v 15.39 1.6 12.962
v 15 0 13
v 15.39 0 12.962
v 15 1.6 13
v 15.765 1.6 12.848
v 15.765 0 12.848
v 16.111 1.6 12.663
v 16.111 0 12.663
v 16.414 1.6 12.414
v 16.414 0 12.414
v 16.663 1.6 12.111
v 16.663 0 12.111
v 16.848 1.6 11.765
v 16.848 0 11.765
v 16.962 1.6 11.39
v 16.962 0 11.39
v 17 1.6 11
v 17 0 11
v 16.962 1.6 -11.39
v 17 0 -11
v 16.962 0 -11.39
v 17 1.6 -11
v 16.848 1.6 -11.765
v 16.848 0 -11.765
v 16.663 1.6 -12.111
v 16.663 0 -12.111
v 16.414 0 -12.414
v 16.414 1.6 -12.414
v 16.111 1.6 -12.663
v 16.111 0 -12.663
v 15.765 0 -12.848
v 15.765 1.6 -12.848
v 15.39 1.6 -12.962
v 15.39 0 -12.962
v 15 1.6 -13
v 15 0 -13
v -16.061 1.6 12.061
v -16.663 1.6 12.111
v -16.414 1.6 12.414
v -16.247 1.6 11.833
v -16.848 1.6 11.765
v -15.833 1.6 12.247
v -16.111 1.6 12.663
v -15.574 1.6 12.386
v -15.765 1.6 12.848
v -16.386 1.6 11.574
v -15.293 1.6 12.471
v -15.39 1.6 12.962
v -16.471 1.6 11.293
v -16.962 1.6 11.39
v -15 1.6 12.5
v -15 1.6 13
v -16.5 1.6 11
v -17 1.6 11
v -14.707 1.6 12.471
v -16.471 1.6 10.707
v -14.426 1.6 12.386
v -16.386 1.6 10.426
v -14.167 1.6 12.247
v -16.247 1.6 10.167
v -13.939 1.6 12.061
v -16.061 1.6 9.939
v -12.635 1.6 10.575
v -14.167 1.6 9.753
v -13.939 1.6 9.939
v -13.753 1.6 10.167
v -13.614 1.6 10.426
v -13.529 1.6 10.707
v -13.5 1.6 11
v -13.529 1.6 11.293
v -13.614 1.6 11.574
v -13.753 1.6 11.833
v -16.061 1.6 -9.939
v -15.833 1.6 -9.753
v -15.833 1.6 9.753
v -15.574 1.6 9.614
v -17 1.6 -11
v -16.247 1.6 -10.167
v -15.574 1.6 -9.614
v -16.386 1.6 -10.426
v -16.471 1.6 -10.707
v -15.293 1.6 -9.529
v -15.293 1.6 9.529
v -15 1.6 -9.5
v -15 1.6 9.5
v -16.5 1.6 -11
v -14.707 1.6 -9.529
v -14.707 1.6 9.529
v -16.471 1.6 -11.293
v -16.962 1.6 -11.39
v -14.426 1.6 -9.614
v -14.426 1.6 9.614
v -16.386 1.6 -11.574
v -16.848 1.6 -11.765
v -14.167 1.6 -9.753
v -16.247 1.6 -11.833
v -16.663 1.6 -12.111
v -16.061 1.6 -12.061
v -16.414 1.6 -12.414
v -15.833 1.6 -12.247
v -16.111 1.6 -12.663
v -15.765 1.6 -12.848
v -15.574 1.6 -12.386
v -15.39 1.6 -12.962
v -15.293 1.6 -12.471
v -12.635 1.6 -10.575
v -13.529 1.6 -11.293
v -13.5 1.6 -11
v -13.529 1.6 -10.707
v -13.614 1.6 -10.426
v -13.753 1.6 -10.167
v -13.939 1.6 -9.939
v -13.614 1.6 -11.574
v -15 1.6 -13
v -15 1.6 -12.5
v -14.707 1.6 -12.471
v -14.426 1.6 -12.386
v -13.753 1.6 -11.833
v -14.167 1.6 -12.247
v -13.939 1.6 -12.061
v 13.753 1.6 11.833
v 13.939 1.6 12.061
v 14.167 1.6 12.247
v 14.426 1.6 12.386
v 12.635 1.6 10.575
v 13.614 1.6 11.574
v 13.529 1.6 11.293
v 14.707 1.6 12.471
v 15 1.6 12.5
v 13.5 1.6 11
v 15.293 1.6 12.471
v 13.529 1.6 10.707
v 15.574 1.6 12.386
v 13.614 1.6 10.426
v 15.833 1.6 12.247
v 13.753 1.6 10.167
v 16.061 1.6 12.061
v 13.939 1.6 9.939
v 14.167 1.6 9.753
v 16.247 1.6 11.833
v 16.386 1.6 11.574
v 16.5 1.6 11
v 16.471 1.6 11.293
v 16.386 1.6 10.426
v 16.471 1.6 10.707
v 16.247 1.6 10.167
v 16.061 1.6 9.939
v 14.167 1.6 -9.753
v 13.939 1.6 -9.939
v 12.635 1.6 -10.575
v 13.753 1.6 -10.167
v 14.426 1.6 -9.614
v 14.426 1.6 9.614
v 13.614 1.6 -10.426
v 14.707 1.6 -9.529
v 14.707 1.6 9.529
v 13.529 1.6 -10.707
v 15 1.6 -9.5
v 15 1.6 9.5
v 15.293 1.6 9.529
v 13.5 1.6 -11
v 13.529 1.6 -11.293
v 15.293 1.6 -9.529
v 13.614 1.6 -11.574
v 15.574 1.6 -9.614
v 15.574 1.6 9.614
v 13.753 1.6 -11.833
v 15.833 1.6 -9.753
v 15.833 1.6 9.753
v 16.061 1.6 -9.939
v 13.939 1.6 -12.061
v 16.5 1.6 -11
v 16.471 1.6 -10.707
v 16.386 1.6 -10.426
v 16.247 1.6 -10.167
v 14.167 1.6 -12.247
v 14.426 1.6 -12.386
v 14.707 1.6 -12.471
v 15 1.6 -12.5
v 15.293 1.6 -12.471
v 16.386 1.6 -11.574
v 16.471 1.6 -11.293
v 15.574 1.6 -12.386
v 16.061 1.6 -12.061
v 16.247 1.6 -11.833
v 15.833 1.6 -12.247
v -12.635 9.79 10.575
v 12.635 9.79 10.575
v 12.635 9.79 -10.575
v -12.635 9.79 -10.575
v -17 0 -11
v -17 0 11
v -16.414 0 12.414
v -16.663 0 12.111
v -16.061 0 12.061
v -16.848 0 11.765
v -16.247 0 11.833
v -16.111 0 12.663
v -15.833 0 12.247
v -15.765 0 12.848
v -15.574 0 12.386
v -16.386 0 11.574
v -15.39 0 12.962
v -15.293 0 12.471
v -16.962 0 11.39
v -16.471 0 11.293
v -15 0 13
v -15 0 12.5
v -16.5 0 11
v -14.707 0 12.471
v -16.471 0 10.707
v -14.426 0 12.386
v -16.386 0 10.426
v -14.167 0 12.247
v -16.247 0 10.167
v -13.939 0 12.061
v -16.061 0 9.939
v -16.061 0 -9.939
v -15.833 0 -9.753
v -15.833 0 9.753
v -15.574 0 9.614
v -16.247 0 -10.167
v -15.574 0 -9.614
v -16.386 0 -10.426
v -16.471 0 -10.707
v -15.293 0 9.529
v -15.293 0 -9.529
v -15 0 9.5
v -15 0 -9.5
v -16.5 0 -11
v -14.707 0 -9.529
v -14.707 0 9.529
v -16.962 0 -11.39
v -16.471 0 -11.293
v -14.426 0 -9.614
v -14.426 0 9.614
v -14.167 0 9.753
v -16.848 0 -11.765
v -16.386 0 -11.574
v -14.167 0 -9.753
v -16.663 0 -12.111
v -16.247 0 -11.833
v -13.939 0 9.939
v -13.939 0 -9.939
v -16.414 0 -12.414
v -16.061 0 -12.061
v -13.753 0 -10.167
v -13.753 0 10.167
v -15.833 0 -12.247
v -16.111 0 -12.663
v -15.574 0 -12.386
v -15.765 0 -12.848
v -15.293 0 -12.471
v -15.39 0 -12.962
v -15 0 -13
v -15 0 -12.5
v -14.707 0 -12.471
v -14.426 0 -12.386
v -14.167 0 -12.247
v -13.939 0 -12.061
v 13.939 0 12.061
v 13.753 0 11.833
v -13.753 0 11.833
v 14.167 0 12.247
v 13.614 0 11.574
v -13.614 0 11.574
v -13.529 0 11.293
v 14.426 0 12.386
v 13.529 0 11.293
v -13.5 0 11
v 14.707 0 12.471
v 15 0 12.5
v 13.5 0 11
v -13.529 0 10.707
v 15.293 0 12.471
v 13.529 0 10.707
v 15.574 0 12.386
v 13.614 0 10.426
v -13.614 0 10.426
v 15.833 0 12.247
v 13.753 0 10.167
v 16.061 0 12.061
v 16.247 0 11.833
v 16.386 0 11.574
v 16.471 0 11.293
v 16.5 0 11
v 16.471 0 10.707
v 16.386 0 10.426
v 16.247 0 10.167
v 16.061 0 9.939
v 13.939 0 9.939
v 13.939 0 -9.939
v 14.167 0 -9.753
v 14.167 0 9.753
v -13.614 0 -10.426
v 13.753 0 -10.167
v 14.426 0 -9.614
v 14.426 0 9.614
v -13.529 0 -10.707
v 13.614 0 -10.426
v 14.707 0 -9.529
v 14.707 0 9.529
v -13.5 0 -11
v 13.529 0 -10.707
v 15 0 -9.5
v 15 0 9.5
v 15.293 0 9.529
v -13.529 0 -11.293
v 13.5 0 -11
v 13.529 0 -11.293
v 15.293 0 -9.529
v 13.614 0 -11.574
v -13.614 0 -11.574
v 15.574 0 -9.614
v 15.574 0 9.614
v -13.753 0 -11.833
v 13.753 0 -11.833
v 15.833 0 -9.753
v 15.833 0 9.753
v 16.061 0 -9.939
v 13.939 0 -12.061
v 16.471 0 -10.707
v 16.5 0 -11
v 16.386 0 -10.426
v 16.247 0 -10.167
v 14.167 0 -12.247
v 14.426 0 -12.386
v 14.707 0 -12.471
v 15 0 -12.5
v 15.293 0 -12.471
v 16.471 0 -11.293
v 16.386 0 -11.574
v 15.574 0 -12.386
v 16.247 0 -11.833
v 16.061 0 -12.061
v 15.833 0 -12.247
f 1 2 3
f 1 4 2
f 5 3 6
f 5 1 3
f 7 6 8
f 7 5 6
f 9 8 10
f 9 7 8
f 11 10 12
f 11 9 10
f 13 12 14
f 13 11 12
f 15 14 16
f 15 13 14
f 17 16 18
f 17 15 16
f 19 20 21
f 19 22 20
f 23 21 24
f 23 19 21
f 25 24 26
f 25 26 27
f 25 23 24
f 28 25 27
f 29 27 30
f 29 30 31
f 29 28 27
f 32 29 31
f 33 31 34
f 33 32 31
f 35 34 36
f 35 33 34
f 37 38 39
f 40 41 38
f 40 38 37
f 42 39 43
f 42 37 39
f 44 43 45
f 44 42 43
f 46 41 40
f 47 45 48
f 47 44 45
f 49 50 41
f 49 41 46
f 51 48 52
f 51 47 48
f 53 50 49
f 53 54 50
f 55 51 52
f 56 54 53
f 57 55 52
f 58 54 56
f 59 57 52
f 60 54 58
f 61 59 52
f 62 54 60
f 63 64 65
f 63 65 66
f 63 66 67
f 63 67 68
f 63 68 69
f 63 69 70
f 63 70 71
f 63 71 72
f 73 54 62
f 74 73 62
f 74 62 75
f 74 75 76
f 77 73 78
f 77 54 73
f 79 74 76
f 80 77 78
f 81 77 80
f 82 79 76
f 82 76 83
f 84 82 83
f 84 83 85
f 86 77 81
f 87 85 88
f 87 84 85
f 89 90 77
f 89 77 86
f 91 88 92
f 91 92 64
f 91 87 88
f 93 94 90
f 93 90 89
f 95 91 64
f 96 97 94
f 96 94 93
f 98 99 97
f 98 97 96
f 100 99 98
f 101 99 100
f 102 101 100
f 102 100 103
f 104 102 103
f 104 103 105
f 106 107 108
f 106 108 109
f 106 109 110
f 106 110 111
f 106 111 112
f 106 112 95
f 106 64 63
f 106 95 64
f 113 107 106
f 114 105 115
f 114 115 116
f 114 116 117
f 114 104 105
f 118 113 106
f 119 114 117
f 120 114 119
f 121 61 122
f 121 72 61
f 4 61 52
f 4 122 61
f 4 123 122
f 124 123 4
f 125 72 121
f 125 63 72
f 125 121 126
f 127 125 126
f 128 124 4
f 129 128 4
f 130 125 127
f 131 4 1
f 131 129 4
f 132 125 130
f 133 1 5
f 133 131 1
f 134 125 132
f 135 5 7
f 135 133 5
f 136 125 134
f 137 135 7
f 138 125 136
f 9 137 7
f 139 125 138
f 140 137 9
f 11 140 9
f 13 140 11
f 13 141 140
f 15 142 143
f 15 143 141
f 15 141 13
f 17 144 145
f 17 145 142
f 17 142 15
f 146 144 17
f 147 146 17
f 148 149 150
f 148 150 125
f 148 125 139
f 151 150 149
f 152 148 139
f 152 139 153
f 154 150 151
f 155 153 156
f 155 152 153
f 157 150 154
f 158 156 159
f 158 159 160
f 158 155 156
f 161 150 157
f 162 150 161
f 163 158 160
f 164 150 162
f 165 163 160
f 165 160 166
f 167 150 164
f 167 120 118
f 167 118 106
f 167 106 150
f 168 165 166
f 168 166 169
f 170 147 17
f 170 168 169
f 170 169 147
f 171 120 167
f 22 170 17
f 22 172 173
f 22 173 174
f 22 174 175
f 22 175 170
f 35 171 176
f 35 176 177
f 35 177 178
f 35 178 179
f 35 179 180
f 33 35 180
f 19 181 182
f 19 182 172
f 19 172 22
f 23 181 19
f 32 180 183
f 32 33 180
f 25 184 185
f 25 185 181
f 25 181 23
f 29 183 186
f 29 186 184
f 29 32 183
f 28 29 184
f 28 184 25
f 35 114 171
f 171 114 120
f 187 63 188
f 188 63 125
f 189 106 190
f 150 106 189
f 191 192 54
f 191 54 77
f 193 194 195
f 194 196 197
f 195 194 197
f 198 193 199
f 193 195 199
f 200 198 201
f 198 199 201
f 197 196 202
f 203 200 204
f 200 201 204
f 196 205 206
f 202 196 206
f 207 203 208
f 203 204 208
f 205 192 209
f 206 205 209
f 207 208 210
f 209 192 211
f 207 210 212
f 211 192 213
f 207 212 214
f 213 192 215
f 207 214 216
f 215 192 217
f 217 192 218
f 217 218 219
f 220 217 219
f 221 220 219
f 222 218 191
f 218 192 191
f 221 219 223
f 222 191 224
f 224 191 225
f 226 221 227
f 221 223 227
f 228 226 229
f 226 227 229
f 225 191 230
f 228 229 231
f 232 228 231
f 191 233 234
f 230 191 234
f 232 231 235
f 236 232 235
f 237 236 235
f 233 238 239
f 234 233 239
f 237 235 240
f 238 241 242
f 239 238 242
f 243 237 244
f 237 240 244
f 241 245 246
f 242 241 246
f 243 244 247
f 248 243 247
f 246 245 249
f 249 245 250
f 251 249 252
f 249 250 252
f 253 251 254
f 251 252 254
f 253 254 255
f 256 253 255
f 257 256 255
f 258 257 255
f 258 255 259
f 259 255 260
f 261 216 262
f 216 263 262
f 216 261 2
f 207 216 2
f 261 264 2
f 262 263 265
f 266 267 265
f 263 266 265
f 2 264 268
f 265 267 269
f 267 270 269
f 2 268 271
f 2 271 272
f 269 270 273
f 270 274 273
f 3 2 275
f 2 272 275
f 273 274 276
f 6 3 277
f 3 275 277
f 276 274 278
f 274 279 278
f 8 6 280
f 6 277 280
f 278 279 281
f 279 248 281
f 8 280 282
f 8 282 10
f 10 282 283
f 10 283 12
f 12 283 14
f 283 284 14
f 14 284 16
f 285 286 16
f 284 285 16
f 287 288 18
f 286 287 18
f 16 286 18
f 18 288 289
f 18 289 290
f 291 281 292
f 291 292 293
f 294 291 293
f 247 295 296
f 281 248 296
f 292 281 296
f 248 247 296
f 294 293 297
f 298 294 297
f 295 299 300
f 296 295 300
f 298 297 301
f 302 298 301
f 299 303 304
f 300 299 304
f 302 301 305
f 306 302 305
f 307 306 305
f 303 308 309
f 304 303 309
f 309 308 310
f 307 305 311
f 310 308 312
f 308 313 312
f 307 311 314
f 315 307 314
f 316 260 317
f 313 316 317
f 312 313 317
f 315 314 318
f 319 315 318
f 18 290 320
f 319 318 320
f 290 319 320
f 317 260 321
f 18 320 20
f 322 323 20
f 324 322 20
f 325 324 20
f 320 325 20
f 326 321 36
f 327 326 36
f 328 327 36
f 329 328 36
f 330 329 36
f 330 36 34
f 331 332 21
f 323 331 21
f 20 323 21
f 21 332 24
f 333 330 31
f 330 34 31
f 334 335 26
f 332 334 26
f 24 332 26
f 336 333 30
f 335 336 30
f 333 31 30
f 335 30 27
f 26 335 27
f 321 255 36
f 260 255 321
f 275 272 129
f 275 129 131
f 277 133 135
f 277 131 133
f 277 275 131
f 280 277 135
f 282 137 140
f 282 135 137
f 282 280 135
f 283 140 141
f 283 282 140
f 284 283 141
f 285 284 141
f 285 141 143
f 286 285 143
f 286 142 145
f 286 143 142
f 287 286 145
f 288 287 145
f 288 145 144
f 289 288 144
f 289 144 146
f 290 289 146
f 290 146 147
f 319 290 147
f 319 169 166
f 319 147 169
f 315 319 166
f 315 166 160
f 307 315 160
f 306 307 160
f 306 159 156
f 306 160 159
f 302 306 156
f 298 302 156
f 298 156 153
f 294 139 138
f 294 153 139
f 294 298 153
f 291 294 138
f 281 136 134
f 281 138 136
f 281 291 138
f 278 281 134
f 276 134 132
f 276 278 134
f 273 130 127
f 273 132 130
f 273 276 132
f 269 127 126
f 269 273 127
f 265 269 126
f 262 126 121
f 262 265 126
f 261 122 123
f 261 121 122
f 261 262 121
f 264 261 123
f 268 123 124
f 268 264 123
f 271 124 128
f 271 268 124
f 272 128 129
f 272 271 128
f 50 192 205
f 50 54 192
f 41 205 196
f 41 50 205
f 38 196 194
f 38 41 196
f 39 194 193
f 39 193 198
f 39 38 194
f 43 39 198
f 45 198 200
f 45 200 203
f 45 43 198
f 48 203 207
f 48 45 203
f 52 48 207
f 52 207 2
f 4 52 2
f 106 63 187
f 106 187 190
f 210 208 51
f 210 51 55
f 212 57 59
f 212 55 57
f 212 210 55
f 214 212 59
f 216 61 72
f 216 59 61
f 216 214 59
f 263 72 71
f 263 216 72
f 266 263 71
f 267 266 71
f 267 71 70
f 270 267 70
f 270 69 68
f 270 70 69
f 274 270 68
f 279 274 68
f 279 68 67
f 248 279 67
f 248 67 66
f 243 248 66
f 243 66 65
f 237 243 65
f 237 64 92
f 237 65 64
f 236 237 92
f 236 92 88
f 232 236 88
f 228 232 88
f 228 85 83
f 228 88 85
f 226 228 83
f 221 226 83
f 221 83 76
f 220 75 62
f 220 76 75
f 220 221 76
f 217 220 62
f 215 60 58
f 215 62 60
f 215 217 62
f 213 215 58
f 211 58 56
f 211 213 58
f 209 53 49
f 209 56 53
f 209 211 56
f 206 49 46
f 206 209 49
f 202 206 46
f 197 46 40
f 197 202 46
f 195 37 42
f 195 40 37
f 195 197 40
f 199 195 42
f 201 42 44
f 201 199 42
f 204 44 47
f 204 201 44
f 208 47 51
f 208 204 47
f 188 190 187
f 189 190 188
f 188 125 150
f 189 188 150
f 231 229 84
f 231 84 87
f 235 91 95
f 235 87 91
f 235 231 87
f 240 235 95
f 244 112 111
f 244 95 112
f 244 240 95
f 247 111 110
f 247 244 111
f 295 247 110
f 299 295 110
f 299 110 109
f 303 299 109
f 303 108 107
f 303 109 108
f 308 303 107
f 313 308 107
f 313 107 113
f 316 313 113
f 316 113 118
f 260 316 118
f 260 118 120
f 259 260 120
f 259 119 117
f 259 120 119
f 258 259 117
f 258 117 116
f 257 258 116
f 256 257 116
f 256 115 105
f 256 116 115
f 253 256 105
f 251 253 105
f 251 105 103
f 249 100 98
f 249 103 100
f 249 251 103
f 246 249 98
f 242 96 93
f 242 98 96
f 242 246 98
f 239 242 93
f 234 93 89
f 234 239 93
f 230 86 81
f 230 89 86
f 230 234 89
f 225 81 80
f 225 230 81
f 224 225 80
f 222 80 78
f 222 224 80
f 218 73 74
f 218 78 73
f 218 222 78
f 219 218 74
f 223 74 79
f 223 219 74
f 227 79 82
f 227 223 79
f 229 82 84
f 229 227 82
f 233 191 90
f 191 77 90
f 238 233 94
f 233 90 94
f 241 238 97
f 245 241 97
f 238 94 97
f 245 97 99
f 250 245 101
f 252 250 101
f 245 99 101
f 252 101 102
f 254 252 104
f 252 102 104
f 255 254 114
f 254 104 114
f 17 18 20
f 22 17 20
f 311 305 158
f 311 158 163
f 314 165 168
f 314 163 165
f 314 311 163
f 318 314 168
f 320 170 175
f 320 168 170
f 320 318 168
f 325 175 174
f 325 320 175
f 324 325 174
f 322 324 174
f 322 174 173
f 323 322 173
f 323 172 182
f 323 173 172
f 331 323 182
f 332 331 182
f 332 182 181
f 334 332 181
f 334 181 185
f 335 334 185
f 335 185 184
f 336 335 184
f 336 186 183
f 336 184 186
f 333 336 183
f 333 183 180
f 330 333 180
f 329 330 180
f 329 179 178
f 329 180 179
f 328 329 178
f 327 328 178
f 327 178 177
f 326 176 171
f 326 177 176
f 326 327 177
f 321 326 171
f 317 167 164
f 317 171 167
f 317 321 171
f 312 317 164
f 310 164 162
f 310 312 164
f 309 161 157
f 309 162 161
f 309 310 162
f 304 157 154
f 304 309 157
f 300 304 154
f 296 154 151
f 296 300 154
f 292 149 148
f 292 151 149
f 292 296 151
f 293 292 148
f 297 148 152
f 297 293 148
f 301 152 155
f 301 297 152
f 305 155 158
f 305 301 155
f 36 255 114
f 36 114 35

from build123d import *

# Parameters (mm, degrees)
SKETCH1_W               = 34
SKETCH1_H               = 26
BOSS_EXTRUDE1_DEPTH     = 1.6
FILLET1_R               = 2
SKETCH4_W               = 25.27
SKETCH4_H               = 21.15
BOSS_EXTRUDE3_DEPTH     = 8.19
CUT_EXTRUDE1_DEPTH      = 23.914539053
CUT_EXTRUDE1_DEPTH_BACK = 23.914539053
SKETCH5_R               = 1.5


with BuildPart() as part:
    # Sketch1 → Boss-Extrude1 (new body)
    with BuildSketch(Plane(origin=(0, 0, 0), x_dir=(1, 0, 0), z_dir=(0, 1, 0))):
        Rectangle(SKETCH1_W, SKETCH1_H)
    extrude(amount=BOSS_EXTRUDE1_DEPTH)

    # Fillet1
    fillet1_edges = [part.edges().sort_by_distance(p)[0] for p in [
        (-17, 0.8, -13),
        (17, 0.8, -13),
        (17, 0.8, 13),
        (-17, 0.8, 13),
    ]]
    fillet(fillet1_edges, radius=FILLET1_R)

    # Sketch4 → Boss-Extrude3 (add)
    with BuildSketch(Plane(origin=(0, 1.6, 0), x_dir=(1, 0, 0), z_dir=(0, 1, 0))):
        Rectangle(SKETCH4_W, SKETCH4_H)
    extrude(amount=BOSS_EXTRUDE3_DEPTH)

    # Sketch5 → Cut-Extrude1 (cut, two sides: drawn at the far end of the back side and taken through both)
    with BuildSketch(Plane(origin=(0, 1.6, 0), x_dir=(1, 0, 0), z_dir=(0, 1, 0)).offset(-CUT_EXTRUDE1_DEPTH_BACK)):
        with Locations(Location((15, 11, 0), (0, 0, 270))):
            Circle(SKETCH5_R)
        with Locations(Location((15, -11, 0), (0, 0, 270))):
            Circle(SKETCH5_R)
        with Locations(Location((-15, -11, 0), (0, 0, 270))):
            Circle(SKETCH5_R)
        with Locations(Location((-15, 11, 0), (0, 0, 270))):
            Circle(SKETCH5_R)
    extrude(amount=CUT_EXTRUDE1_DEPTH + CUT_EXTRUDE1_DEPTH_BACK, mode=Mode.SUBTRACT)


solid = part.part
